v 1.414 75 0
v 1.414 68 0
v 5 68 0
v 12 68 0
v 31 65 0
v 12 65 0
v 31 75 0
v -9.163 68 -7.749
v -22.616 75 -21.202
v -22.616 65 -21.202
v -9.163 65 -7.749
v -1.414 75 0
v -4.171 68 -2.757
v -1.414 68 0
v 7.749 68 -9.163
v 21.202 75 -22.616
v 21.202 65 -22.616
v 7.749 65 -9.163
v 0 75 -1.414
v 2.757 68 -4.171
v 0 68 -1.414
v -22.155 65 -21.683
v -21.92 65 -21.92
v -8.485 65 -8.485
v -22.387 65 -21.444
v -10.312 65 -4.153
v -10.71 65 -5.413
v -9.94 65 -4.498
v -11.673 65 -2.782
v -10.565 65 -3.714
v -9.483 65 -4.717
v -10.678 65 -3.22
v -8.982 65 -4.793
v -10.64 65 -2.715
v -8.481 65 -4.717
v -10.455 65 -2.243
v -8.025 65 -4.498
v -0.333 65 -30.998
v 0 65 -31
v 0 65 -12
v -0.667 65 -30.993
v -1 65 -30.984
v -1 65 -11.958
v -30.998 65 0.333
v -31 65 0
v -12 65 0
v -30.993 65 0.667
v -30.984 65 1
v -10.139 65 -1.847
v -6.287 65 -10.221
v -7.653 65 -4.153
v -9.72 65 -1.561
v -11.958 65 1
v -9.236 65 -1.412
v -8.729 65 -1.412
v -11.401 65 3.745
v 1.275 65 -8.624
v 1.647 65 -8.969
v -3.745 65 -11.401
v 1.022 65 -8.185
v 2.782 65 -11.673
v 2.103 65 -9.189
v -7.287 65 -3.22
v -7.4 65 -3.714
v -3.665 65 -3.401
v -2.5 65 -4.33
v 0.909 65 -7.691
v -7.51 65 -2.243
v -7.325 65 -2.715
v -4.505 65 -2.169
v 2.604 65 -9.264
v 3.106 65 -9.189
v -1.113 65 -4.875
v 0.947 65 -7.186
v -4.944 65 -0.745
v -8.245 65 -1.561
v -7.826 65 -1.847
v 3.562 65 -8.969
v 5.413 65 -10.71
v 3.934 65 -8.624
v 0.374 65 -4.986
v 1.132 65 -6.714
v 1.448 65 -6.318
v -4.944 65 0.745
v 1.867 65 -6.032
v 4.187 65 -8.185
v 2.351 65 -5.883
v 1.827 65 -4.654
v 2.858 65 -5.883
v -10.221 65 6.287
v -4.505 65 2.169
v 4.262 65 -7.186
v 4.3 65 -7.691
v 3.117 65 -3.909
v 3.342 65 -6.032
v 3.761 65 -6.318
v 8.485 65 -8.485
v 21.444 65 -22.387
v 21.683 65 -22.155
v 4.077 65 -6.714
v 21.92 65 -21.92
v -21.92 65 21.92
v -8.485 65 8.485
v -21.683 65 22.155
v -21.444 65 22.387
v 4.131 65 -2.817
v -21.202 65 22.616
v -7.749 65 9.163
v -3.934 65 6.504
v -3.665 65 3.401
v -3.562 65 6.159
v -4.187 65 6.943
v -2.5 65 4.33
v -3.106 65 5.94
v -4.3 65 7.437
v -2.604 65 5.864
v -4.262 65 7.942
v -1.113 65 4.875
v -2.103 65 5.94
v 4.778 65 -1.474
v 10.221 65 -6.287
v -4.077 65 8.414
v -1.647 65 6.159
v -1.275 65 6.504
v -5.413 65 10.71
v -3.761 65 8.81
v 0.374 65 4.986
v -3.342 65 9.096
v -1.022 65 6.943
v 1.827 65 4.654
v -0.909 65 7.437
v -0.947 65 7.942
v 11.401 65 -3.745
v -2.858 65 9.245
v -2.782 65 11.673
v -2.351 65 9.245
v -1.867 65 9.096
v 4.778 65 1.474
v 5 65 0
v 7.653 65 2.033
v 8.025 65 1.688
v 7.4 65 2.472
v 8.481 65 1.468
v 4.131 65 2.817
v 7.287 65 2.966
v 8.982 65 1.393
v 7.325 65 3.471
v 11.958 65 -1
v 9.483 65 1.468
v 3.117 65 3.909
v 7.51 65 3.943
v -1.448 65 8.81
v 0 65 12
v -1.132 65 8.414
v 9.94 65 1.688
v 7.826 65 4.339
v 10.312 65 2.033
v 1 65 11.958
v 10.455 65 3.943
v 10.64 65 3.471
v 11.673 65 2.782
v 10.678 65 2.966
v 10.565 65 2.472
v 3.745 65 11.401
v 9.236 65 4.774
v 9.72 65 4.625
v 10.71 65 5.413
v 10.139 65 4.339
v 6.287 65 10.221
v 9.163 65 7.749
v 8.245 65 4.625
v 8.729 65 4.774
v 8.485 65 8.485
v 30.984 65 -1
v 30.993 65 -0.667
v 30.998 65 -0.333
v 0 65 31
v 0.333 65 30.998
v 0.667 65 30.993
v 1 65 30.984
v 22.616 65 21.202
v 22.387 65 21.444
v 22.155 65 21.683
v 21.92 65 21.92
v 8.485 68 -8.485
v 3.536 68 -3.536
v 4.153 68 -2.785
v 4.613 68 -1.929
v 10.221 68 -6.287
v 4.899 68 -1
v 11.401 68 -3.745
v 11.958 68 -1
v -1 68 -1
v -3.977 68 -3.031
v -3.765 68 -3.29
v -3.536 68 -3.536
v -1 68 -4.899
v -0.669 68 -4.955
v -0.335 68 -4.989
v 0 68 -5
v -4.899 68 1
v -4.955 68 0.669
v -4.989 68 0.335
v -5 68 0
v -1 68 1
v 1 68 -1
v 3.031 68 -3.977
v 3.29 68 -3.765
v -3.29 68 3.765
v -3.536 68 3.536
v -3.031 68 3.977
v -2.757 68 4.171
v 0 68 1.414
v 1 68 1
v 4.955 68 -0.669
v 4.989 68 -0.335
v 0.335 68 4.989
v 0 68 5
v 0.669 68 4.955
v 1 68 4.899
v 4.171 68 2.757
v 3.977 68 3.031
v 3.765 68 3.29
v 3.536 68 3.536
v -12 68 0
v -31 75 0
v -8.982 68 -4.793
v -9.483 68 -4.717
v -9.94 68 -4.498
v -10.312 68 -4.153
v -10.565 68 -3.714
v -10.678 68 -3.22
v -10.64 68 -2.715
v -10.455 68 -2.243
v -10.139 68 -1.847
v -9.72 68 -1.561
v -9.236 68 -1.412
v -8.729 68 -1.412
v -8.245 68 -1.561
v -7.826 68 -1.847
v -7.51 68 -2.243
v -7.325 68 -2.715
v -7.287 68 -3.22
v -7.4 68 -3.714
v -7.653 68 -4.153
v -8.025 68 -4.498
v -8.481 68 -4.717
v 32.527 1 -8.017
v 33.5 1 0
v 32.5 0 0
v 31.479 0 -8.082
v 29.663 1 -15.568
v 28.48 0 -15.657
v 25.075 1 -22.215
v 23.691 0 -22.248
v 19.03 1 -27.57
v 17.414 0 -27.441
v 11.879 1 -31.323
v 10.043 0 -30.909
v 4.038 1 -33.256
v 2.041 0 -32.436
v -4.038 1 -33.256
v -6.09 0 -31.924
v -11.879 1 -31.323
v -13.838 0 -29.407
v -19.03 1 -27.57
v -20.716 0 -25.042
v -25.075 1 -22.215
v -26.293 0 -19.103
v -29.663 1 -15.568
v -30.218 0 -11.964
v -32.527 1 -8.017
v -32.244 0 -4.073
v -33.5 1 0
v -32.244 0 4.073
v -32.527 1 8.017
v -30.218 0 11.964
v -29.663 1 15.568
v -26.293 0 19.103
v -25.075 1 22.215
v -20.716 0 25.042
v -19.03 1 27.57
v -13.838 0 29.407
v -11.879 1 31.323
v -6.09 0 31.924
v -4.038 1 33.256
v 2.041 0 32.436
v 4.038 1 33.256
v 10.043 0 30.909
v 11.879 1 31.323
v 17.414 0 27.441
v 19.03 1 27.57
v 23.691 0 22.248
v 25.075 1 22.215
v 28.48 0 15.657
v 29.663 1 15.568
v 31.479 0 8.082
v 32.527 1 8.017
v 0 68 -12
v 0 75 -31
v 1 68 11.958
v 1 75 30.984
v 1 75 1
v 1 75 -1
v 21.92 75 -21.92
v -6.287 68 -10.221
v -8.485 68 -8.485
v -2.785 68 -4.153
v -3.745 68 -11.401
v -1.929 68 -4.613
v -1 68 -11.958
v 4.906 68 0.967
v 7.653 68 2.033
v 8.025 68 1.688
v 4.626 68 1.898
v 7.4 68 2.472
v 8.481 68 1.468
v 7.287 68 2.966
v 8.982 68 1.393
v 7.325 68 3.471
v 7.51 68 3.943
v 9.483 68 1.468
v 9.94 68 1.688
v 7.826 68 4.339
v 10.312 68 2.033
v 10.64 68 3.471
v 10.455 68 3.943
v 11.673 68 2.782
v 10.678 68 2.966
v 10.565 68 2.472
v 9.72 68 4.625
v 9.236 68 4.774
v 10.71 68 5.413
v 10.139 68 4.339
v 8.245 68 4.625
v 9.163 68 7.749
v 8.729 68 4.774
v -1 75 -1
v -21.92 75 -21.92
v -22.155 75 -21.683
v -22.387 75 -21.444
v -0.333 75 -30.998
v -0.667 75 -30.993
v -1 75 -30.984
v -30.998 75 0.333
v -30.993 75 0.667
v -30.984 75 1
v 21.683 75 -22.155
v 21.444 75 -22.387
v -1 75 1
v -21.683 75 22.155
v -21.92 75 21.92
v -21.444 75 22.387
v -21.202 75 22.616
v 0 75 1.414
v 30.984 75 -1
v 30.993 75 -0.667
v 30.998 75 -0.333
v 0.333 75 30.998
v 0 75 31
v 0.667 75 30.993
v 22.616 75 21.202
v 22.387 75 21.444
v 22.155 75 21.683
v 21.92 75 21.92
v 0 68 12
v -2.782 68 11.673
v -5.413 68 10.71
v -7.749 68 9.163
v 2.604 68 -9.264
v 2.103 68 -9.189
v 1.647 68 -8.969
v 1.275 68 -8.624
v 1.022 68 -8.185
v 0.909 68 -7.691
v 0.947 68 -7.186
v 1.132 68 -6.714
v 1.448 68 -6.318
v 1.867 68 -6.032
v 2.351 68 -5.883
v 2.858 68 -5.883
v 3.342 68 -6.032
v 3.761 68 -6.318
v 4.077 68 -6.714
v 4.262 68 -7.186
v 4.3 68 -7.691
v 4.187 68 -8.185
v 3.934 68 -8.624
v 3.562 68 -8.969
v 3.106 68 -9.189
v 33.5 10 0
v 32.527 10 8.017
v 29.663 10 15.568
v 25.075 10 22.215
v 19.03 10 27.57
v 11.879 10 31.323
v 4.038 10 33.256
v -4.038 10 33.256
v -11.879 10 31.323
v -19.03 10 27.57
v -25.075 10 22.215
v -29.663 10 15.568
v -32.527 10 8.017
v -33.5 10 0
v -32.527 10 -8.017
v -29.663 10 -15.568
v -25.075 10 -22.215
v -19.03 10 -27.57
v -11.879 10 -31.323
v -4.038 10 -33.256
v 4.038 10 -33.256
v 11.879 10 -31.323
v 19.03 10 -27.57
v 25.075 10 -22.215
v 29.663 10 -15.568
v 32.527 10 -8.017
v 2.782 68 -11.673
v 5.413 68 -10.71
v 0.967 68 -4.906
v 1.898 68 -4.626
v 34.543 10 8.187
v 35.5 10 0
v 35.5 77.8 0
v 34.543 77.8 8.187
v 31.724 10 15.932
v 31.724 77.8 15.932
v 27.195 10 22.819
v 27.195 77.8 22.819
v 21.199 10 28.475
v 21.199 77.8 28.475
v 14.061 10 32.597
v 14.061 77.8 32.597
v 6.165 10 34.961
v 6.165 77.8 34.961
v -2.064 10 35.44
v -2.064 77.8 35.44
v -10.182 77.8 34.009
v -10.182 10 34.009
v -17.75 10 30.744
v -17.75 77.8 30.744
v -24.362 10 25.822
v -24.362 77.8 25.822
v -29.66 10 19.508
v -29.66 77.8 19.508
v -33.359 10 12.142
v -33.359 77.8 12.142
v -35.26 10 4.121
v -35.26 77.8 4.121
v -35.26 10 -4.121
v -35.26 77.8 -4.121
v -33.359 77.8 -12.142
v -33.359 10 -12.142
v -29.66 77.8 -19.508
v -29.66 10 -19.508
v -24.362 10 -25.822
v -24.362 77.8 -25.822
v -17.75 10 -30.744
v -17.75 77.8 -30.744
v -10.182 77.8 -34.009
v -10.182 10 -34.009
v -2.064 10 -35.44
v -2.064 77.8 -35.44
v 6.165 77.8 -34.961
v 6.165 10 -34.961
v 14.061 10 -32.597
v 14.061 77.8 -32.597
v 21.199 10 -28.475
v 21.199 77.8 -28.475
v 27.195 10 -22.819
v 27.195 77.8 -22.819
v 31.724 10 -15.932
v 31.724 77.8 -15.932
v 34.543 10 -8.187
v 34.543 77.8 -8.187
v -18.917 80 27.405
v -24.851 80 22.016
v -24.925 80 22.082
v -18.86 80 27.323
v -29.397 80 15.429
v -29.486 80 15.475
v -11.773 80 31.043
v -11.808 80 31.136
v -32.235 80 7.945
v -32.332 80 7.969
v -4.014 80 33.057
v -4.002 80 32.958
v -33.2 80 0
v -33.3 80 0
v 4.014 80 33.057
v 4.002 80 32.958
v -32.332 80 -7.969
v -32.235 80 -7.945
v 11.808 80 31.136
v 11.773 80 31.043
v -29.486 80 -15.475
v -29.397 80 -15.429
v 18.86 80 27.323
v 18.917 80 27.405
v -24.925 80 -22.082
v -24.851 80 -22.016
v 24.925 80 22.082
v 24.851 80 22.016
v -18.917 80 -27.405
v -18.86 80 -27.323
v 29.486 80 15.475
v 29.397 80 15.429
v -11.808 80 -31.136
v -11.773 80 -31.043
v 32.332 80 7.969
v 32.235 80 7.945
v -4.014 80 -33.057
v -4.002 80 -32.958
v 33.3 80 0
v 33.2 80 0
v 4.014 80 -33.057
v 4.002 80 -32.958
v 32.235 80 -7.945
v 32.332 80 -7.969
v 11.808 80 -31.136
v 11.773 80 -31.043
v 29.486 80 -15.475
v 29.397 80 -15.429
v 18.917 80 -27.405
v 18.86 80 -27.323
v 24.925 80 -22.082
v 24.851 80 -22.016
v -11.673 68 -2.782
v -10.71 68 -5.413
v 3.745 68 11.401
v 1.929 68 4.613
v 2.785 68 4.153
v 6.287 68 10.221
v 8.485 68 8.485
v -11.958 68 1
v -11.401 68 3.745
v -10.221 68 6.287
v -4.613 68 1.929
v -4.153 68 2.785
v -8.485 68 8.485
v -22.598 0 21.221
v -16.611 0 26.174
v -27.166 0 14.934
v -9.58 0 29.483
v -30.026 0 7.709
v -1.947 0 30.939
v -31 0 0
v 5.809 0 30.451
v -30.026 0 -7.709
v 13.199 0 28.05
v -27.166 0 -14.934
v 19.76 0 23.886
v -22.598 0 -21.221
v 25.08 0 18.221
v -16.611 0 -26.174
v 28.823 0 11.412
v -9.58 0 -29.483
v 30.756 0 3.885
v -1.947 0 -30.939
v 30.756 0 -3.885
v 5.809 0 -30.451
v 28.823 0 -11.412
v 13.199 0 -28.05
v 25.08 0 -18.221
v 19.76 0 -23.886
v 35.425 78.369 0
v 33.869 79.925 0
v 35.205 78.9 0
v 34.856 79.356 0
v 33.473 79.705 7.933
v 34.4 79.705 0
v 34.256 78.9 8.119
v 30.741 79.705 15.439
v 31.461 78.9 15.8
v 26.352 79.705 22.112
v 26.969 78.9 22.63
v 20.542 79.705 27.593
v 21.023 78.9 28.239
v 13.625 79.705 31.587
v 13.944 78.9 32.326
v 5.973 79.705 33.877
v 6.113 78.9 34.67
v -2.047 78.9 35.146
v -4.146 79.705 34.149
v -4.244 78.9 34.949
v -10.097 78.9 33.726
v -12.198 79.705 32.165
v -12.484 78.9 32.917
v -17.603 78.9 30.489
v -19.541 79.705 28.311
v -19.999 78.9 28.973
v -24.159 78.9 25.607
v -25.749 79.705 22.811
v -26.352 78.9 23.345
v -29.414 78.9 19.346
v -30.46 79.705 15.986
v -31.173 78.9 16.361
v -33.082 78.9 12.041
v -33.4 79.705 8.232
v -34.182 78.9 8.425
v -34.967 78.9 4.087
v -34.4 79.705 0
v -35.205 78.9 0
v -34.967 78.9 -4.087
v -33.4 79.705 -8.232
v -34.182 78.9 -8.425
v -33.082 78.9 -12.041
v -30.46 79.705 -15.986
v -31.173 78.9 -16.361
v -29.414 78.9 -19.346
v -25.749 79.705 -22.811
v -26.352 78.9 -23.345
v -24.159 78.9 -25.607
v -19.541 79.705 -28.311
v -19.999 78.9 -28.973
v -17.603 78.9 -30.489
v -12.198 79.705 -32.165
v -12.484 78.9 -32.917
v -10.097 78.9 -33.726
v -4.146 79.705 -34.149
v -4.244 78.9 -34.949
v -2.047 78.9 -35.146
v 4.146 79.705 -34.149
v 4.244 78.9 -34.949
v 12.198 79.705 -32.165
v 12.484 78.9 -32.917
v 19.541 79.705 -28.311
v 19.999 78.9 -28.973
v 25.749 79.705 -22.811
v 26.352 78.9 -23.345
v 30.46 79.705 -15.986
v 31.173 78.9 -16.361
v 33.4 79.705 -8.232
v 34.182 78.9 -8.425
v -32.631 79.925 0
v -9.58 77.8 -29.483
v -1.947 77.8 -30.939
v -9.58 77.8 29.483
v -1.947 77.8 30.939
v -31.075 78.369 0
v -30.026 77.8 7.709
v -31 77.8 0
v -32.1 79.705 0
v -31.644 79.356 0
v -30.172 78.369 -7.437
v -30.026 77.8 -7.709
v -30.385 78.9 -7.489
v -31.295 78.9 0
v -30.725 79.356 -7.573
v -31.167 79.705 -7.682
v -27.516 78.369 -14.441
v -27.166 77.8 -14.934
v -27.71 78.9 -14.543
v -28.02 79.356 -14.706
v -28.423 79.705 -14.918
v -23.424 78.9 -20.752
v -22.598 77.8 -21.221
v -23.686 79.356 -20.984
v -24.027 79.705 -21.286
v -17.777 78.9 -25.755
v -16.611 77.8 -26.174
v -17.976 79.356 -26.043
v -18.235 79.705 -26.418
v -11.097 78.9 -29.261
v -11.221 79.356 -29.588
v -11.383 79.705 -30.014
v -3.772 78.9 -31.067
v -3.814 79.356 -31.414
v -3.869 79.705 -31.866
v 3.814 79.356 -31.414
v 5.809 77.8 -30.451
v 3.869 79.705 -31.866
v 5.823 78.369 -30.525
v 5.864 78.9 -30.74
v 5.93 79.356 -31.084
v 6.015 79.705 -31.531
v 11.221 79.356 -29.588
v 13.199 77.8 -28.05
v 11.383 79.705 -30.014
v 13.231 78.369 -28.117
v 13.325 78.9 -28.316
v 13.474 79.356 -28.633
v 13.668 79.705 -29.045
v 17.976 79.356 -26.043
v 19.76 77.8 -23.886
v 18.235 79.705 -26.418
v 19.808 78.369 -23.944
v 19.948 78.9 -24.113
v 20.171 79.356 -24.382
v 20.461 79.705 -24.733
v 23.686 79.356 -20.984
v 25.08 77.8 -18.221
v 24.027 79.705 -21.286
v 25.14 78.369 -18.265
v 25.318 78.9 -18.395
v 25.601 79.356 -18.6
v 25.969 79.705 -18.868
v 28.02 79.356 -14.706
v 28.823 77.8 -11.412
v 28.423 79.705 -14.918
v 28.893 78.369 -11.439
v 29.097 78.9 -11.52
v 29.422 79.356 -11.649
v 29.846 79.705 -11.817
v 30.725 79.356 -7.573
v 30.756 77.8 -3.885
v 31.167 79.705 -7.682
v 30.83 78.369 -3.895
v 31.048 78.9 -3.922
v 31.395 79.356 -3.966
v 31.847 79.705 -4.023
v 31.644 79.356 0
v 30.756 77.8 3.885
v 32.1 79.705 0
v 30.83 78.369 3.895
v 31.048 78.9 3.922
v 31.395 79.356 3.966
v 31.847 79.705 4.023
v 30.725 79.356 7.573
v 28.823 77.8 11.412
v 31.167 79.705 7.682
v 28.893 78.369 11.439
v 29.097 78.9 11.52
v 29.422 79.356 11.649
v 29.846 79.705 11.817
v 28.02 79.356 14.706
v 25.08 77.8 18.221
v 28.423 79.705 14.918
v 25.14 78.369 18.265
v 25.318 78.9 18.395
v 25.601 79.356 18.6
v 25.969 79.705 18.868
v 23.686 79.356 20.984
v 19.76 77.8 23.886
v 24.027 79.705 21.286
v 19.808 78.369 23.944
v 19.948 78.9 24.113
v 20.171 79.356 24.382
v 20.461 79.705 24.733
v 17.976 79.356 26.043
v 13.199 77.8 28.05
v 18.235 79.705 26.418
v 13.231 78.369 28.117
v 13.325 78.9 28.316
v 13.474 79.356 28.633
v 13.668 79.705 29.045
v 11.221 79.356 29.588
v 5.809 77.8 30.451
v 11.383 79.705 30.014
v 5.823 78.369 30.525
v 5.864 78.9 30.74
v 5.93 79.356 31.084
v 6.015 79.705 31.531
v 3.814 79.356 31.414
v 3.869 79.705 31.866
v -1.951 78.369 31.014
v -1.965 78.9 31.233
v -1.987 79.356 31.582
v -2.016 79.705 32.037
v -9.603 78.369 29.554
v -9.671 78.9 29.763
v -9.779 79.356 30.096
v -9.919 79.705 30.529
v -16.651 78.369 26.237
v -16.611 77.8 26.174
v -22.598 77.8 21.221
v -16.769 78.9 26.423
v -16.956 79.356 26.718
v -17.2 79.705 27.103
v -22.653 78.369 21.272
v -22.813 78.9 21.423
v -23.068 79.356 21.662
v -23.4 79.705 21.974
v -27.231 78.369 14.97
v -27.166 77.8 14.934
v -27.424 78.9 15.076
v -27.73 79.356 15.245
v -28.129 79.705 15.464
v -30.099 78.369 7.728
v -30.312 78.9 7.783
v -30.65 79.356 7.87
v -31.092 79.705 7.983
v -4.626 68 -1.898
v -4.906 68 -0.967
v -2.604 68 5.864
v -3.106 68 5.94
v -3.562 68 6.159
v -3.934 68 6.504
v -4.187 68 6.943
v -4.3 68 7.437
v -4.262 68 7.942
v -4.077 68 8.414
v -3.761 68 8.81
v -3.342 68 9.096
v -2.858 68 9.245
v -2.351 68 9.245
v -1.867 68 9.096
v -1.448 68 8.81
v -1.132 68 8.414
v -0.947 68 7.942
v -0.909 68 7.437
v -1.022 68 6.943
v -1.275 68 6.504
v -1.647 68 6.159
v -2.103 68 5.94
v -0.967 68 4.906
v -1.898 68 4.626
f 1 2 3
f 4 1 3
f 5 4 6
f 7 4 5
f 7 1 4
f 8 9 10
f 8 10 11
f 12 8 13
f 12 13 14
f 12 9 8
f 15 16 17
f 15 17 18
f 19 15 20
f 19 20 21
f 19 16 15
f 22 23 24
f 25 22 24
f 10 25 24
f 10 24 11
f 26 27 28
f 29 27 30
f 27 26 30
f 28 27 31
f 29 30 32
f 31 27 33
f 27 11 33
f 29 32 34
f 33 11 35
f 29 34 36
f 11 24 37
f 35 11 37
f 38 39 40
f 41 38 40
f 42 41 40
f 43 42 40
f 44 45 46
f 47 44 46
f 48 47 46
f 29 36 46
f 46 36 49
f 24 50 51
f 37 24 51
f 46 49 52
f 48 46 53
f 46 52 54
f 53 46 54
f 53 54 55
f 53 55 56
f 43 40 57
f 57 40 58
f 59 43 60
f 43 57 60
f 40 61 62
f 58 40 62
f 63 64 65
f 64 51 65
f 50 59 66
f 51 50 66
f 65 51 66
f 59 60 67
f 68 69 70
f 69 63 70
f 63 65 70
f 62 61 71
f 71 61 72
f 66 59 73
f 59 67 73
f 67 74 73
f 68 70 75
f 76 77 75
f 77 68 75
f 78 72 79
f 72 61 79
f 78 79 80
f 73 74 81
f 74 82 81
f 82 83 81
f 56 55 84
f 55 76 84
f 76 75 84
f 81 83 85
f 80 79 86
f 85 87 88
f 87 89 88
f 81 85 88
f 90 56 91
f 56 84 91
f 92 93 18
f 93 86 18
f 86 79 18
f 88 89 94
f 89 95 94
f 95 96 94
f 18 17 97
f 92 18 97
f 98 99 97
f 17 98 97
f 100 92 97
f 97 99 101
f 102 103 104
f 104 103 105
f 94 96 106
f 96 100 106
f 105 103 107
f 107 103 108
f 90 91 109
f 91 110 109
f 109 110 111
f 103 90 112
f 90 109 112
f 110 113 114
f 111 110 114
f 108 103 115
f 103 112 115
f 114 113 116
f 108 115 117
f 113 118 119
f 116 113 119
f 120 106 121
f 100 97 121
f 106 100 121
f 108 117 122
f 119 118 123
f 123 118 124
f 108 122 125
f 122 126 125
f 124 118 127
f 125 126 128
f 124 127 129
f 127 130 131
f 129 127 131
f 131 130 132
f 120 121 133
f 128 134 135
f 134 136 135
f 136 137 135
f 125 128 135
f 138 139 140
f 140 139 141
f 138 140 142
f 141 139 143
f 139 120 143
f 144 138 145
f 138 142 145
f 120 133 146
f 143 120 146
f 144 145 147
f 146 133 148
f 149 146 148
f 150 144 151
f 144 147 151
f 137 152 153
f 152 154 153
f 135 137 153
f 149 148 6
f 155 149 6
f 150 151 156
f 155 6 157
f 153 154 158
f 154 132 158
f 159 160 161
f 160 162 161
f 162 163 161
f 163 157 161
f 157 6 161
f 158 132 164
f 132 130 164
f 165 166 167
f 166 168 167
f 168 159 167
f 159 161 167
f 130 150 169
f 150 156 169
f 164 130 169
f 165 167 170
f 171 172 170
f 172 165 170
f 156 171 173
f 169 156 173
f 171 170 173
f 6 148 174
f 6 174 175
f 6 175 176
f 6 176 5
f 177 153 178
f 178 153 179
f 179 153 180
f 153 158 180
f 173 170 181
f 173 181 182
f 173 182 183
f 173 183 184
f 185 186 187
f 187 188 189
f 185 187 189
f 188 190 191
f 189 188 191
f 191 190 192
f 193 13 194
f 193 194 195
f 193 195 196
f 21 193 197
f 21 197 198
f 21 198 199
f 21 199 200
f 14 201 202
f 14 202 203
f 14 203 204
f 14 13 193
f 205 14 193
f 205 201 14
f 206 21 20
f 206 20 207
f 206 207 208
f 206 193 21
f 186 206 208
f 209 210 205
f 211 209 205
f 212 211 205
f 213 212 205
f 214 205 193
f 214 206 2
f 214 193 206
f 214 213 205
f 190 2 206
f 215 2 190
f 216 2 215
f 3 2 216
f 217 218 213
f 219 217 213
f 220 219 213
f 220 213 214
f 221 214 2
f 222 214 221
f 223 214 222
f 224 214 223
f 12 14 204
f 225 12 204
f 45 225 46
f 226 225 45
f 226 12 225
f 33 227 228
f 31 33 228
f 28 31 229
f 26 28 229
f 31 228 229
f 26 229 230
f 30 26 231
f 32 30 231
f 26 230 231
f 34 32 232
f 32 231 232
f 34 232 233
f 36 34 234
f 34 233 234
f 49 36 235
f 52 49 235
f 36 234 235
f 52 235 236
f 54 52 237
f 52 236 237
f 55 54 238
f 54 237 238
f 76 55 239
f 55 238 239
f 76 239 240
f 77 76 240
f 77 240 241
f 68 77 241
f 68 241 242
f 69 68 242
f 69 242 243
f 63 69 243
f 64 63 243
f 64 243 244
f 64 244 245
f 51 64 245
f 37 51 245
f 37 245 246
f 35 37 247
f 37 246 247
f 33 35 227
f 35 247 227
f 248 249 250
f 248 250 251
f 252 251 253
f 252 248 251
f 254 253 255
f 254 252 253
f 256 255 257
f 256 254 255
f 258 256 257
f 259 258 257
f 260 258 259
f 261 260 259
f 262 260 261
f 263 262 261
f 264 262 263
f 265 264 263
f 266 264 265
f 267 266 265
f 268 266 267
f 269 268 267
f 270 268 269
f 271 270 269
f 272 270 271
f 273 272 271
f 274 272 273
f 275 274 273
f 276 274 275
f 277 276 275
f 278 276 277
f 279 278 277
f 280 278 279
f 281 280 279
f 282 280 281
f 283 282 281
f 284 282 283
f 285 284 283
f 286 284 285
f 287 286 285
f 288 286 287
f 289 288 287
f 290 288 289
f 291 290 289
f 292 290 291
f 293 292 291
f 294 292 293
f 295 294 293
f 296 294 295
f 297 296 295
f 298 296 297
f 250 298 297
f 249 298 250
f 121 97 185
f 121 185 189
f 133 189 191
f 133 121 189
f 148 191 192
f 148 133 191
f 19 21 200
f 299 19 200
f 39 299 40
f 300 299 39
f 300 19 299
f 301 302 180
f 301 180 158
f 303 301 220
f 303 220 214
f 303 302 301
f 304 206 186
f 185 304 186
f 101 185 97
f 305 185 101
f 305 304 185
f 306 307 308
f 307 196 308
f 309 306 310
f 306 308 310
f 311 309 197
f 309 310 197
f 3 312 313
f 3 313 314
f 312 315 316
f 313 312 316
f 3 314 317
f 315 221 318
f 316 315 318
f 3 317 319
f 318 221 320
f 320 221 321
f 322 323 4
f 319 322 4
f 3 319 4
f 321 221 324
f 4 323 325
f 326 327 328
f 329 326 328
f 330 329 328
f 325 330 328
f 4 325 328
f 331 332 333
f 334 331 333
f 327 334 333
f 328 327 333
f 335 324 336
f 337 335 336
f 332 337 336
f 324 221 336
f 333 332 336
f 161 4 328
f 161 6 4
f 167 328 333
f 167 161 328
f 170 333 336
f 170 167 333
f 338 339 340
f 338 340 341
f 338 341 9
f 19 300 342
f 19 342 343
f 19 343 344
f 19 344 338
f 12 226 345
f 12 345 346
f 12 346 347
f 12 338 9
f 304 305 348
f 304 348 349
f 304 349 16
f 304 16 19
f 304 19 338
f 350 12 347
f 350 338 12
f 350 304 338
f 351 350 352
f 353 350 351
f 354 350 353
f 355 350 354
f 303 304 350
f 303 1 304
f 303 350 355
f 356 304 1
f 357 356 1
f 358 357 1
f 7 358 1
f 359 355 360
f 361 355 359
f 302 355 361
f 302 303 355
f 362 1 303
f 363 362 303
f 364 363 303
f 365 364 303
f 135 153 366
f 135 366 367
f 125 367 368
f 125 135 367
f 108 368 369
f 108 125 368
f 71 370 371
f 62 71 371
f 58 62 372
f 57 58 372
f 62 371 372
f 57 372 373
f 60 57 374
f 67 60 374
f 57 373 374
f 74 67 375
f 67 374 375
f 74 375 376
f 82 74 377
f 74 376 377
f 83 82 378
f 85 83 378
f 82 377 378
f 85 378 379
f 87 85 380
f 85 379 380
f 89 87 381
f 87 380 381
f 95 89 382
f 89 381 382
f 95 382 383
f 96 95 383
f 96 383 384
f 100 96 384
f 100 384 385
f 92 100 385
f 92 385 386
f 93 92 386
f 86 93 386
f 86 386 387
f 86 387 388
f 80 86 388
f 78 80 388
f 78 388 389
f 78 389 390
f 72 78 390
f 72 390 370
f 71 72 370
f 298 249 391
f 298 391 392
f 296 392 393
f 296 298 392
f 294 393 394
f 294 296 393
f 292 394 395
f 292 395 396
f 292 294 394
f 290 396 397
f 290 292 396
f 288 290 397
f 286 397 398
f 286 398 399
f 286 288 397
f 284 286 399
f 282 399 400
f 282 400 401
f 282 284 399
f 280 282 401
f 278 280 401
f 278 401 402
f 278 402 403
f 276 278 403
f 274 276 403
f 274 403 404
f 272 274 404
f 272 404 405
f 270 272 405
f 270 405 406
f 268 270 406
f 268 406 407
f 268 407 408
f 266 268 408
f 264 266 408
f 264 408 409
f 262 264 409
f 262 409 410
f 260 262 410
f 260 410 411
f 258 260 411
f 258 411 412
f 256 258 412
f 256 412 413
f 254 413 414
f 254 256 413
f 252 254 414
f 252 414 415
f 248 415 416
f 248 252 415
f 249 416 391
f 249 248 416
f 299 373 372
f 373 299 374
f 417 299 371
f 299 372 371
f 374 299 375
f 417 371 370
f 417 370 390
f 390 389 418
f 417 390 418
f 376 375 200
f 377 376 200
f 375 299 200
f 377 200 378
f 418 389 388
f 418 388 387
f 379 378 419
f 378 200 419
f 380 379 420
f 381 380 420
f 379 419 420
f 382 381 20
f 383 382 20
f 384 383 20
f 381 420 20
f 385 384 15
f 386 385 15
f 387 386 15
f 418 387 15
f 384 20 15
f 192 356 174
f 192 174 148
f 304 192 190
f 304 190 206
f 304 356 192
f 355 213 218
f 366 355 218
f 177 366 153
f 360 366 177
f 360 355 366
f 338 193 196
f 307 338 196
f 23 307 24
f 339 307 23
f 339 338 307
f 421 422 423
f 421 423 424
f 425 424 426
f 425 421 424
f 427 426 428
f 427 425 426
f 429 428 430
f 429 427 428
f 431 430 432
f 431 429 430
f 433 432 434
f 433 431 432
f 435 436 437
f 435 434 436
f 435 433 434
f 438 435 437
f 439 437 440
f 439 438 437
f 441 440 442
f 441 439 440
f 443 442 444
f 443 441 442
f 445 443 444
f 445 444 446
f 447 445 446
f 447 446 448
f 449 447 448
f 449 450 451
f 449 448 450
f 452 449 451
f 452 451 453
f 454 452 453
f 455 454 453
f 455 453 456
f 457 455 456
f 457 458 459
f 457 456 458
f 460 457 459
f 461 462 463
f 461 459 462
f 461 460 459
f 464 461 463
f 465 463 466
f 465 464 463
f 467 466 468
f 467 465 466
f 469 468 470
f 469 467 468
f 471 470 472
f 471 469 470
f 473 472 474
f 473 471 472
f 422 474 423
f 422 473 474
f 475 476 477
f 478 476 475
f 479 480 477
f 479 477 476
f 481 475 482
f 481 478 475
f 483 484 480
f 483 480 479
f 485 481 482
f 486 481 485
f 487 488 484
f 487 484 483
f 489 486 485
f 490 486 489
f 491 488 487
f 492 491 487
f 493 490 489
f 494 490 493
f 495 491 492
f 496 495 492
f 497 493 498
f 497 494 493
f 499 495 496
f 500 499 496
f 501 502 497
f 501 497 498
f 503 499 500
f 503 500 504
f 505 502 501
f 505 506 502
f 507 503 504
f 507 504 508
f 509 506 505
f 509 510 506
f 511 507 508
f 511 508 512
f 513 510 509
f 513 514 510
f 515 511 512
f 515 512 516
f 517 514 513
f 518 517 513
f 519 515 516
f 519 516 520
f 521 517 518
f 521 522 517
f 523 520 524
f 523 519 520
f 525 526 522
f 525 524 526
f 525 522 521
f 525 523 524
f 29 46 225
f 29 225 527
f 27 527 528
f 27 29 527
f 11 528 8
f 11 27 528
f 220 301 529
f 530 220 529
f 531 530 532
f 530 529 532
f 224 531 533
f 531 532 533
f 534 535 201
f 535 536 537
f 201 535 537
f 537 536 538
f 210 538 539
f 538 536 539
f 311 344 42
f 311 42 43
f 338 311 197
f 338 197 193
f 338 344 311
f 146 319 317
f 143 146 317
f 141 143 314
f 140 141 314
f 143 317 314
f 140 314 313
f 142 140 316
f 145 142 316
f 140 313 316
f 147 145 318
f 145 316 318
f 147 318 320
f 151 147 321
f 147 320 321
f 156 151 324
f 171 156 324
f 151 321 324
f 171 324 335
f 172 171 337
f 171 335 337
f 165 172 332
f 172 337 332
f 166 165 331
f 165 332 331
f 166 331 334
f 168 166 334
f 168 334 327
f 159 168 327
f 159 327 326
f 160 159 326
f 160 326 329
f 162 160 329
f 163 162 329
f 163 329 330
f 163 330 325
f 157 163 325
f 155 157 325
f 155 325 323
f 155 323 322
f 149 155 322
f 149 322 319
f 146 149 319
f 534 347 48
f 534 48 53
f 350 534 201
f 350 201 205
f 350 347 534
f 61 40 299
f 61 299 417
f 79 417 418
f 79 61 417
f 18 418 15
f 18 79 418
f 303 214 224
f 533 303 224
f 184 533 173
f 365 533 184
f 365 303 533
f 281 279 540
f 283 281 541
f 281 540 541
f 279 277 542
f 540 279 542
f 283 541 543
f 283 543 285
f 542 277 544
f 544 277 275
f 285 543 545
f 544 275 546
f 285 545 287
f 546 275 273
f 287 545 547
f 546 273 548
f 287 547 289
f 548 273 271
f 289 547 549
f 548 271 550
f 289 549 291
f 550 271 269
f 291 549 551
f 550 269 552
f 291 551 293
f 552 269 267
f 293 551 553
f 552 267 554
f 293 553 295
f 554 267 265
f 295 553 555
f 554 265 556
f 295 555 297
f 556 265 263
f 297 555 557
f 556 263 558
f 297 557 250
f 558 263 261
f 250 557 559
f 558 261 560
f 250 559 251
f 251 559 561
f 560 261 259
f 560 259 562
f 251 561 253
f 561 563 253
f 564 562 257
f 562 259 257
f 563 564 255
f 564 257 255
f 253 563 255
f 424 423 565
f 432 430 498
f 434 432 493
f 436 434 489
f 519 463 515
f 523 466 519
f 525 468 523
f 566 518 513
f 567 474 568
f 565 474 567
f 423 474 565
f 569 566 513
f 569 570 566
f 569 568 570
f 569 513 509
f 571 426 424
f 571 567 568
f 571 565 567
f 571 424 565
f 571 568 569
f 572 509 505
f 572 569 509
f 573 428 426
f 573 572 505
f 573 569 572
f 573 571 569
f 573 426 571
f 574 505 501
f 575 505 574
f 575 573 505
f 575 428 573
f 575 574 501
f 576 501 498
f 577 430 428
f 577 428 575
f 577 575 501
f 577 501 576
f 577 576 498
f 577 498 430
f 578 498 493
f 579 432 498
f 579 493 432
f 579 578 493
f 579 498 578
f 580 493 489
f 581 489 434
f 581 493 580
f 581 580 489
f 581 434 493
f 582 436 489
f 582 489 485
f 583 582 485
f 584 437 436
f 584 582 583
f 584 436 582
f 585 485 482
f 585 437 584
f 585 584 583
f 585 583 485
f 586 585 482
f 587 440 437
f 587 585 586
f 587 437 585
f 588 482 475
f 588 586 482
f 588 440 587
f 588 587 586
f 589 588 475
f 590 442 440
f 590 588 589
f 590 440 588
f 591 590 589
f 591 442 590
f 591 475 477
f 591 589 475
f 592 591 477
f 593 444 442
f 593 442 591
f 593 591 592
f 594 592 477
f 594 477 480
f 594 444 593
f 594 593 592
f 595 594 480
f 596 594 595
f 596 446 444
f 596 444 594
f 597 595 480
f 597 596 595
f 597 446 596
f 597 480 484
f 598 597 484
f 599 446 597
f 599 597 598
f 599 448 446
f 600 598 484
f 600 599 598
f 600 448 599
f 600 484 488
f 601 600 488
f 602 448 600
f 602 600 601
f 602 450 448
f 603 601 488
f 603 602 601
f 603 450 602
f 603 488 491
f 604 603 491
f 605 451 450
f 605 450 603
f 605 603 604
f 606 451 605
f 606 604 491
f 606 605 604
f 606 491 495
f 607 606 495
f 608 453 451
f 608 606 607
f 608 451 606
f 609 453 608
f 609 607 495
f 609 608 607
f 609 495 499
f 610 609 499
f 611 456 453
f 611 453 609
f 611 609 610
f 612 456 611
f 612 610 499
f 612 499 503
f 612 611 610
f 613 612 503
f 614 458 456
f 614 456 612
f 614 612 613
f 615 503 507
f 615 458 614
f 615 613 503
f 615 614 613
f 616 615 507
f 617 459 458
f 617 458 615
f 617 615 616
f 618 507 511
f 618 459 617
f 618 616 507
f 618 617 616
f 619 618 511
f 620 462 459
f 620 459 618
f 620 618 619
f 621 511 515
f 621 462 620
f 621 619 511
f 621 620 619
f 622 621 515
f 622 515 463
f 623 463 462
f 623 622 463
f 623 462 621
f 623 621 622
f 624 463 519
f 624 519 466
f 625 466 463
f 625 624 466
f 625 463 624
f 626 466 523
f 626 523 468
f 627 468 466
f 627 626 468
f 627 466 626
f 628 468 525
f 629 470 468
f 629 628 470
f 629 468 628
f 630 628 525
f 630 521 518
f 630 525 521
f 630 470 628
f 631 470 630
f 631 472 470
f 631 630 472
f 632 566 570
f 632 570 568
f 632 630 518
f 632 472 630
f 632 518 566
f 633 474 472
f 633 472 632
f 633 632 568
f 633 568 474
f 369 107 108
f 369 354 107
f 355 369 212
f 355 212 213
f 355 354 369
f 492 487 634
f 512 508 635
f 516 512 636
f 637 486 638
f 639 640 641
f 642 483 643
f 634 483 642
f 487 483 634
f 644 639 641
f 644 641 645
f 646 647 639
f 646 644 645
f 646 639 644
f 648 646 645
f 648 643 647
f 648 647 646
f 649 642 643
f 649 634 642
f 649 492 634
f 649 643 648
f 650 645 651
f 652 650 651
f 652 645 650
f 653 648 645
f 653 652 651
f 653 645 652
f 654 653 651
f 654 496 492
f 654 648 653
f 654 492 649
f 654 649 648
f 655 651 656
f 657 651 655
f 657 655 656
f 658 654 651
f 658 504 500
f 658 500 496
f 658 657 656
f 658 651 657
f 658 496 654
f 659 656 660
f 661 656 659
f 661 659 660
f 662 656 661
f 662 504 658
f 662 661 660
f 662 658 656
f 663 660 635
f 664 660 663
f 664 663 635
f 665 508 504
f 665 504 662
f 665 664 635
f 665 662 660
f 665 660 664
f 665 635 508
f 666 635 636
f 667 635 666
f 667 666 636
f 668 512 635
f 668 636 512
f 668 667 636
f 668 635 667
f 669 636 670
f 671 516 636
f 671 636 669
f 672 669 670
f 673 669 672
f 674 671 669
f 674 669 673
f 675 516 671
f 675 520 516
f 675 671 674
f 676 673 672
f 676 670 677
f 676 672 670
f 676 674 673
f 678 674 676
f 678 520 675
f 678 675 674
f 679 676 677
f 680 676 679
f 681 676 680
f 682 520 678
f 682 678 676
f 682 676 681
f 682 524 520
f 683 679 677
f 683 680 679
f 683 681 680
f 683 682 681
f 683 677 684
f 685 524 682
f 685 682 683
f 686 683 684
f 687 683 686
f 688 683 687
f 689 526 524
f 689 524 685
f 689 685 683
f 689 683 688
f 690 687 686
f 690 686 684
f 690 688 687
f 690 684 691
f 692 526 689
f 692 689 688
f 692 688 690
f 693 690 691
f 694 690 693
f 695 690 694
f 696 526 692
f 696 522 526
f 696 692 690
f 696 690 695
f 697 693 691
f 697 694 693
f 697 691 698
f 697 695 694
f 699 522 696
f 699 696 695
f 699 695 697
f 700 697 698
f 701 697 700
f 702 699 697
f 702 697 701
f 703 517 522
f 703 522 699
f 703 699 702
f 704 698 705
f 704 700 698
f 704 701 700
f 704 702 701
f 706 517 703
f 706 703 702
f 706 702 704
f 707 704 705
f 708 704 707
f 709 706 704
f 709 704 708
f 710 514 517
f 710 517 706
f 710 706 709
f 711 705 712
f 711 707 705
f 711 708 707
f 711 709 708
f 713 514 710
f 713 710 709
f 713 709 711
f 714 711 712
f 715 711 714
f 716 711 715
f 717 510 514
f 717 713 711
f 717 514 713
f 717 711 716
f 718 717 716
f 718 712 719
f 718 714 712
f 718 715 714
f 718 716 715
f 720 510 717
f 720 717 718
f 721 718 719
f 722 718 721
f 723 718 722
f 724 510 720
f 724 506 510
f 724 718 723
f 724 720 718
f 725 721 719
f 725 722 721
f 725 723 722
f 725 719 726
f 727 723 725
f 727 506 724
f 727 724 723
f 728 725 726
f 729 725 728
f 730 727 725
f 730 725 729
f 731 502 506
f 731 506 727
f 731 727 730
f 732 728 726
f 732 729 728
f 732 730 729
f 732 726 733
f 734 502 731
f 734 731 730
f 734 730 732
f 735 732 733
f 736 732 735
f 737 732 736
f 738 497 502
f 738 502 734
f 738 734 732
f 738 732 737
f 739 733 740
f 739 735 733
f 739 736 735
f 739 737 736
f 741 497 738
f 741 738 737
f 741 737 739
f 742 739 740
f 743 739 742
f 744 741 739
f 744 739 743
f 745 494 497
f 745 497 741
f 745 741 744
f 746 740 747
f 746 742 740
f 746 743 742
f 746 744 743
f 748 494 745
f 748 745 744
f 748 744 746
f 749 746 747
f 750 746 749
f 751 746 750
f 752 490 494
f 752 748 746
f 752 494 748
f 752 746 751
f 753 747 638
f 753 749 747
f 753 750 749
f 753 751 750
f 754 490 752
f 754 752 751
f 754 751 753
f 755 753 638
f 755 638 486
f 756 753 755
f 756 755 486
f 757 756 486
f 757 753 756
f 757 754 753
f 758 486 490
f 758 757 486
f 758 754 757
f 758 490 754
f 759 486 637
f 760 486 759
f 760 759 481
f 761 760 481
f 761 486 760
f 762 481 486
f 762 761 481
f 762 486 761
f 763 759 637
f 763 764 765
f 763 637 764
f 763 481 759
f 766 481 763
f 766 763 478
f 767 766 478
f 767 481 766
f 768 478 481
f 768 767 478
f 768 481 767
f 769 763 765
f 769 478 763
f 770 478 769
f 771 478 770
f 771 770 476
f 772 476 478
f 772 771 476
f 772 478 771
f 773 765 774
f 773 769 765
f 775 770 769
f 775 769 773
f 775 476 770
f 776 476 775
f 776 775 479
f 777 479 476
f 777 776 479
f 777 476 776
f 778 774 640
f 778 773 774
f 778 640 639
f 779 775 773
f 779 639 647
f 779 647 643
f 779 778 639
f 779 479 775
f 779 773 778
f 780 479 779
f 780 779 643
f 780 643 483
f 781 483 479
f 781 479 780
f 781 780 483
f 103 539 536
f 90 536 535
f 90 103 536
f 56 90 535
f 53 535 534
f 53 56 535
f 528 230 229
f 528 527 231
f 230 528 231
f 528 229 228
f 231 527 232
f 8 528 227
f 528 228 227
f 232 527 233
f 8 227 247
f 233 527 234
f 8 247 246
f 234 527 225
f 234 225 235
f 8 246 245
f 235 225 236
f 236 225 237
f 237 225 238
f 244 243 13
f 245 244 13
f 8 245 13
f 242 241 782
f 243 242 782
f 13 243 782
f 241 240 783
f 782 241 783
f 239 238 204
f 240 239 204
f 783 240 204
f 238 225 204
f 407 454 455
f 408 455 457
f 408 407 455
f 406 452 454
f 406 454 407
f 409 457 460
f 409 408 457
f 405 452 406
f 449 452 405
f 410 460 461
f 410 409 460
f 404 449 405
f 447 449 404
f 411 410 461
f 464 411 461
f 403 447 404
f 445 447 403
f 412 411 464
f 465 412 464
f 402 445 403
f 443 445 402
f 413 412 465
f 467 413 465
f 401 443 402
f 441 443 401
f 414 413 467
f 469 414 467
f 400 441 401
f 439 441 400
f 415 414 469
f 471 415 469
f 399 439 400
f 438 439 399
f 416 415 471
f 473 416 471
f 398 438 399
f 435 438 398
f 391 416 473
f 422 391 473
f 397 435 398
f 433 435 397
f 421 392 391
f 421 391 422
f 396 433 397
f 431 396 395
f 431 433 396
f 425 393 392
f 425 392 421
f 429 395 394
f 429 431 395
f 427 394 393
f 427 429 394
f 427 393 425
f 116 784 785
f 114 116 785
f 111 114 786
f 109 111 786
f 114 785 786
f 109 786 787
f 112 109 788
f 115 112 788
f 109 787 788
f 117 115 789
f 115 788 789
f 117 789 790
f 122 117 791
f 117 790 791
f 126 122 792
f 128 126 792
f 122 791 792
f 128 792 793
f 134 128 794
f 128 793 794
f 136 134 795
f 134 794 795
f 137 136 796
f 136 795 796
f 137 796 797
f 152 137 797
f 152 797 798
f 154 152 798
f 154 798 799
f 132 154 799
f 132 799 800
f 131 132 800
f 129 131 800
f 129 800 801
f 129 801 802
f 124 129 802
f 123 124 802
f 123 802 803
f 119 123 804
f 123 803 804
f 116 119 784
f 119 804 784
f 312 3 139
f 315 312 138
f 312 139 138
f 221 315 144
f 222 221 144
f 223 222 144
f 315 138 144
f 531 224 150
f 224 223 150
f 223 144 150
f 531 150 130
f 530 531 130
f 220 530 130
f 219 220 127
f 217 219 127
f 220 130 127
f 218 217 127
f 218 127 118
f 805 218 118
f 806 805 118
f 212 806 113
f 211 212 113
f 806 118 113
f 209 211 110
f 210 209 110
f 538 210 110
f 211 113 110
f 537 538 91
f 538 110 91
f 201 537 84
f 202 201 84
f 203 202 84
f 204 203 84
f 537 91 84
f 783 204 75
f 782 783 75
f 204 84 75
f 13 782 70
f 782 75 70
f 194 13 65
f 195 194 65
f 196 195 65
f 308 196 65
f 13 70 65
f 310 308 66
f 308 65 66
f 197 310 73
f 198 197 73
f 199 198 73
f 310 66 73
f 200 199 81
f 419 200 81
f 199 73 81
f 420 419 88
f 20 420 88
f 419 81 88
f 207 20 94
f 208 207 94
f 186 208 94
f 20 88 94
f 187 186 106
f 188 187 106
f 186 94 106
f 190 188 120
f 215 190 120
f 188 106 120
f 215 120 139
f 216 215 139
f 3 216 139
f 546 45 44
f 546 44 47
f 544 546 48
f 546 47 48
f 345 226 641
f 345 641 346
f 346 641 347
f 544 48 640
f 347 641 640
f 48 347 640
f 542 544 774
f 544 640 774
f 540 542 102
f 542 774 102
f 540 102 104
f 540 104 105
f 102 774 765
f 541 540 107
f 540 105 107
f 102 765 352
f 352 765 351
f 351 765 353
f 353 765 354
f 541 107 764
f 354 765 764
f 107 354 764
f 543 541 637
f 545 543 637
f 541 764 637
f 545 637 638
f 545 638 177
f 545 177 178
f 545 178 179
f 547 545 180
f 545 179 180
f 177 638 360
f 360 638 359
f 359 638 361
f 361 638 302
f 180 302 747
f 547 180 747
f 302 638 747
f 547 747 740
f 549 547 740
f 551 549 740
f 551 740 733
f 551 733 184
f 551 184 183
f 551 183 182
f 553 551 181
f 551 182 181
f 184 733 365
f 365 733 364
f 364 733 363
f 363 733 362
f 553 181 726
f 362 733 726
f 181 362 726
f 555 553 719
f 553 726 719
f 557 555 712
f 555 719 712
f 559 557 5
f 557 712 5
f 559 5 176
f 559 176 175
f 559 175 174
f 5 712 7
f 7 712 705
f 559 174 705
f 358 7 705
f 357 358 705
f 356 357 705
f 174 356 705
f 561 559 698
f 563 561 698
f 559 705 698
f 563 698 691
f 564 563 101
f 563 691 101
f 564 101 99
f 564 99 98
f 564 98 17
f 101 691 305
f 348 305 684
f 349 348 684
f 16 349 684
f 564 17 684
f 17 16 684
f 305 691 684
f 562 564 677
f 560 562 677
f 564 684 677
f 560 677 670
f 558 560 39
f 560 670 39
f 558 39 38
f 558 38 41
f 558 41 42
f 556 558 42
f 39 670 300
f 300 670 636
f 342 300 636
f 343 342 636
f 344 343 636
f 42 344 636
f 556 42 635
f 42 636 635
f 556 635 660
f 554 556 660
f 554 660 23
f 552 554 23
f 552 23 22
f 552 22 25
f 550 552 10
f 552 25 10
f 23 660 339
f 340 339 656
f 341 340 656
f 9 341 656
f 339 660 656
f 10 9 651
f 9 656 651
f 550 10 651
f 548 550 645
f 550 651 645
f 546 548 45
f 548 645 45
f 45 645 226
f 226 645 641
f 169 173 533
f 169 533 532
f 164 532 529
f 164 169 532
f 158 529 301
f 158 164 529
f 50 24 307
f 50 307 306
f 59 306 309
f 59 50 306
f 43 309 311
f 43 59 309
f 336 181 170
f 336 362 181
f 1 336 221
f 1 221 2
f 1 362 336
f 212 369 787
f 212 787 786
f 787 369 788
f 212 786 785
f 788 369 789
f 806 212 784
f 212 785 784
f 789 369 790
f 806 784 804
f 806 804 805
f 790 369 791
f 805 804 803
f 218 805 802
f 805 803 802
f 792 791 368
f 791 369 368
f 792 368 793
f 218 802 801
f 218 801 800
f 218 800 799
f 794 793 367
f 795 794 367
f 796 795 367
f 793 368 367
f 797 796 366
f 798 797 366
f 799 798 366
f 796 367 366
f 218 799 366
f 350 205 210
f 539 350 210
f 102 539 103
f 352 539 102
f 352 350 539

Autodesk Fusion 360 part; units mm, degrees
sketch "草图1" plane through (0, 0, 0) normal (0, 1, 0) x (1, 0, 0)
  circle A0 centre (0, 0) radius 35.5
  dimension "d1" = 71
extrude "拉伸1" add sketch "草图1" along normal blind 80
sketch "草图2" plane through (0, 80, 0) normal (0, 1, 0) x (-1, 0, 0)
  circle A0 centre (0, 0) radius 35.5
  circle A1 centre (0, 0) radius 31
  dimension "d4" = 62
extrude "拉伸2" cut sketch "草图2" against normal blind 90 contours A1
ref_plane "WorkPlane2" through (0, 75, 0) normal (0, 1, 0) x (-1, 0, 0)
sketch "Sketch5" plane through (0, 75, 0) normal (0, 1, 0) x (1, 0, 0)
  line L0 (0, 0) -> (31, 0)
  line L1 (31, 0) -> (31, 1)
  line L2 (31, 1) -> (0, 1)
  line L3 (0, 1) -> (0, 0)
  circle A0 centre (0, 0) radius 35.5
  circle A1 centre (0, 0) radius 35.5
  circle A2 centre (0, 0) radius 31
  dimension "d18" = 1
extrude "Extrude5" add sketch "Sketch5" against normal blind 10 contours L0 L2 L3 A2 picked at (10.328, 0.6667)
pattern_circular "C-Pattern1" count 8 over 360 about axis through (0, 1.75, 0) along (0, 1, 0) of "Extrude5"
sketch "Sketch6" plane through (0, 65, 0) normal (0, -1, 0) x (1, 0, 0)
  line L0 (1.4142, 0) -> (22.616, 21.2018)
  arc A0 (22.616, 21.2018) -> (21.9203, 21.9203) centre (0, 0) ccw
  line L1 (21.9203, 21.9203) -> (1, 1)
  line L2 (1, 1) -> (1, 30.9839)
  arc A1 (1, 30.9839) -> (0, 31) centre (0, 0) ccw
  line L3 (0, 31) -> (0, 1.4142)
  line L4 (0, 1.4142) -> (-21.2018, 22.616)
  arc A2 (-21.2018, 22.616) -> (-21.9203, 21.9203) centre (0, 0) ccw
  line L5 (-21.9203, 21.9203) -> (-1, 1)
  line L6 (-1, 1) -> (-30.9839, 1)
  arc A3 (-30.9839, 1) -> (-31, 0) centre (0, 0) ccw
  line L7 (-31, 0) -> (-1.4142, 0)
  line L8 (-1.4142, 0) -> (-22.616, -21.2018)
  arc A4 (-22.616, -21.2018) -> (-21.9203, -21.9203) centre (0, 0) ccw
  line L9 (-21.9203, -21.9203) -> (-1, -1)
  line L10 (-1, -1) -> (-1, -30.9839)
  arc A5 (-1, -30.9839) -> (0, -31) centre (0, 0) ccw
  line L11 (0, -31) -> (0, -1.4142)
  line L12 (0, -1.4142) -> (21.2018, -22.616)
  arc A6 (21.2018, -22.616) -> (21.9203, -21.9203) centre (0, 0) ccw
  line L13 (21.9203, -21.9203) -> (1, -1)
  line L14 (1, -1) -> (30.9839, -1)
  arc A7 (30.9839, -1) -> (31, 0) centre (0, 0) ccw
  line L15 (31, 0) -> (1.4142, 0)
  circle A8 centre (0, 0) radius 12
  dimension "d23" = 24
extrude "Extrude6" add sketch "Sketch6" against normal blind 3 contours L0 L1 L2 L3 L4 L5 L6 L7 L8 L9 L10 L11 L12 L13 L14 L15 A8 | L0 L15 A8 | L1 L2 A8 | L13 L14 A8 | L3 L4 A8 | L11 L12 A8 | L5 L6 A8 | L9 L10 A8 | L7 L8 A8
sketch "Sketch7" plane through (0, 65, 0) normal (0, -1, 0) x (1, 0, 0)
  line L0 (9.1629, 7.7487) -> (22.616, 21.2018)
  arc A0 (22.616, 21.2018) -> (21.9203, 21.9203) centre (0, 0) ccw
  line L1 (21.9203, 21.9203) -> (8.4853, 8.4853)
  arc A1 (8.4853, 8.4853) -> (1, 11.9583) centre (0, 0) ccw
  line L2 (1, 11.9583) -> (1, 30.9839)
  arc A2 (1, 30.9839) -> (0, 31) centre (0, 0) ccw
  line L3 (0, 31) -> (0, 12)
  arc A3 (0, 12) -> (-7.7487, 9.1629) centre (0, 0) ccw
  line L4 (-7.7487, 9.1629) -> (-21.2018, 22.616)
  arc A4 (-21.2018, 22.616) -> (-21.9203, 21.9203) centre (0, 0) ccw
  line L5 (-21.9203, 21.9203) -> (-8.4853, 8.4853)
  arc A5 (-8.4853, 8.4853) -> (-11.9583, 1) centre (0, 0) ccw
  line L6 (-11.9583, 1) -> (-30.9839, 1)
  arc A6 (-30.9839, 1) -> (-31, 0) centre (0, 0) ccw
  line L7 (-31, 0) -> (-12, 0)
  arc A7 (-12, 0) -> (-9.1629, -7.7487) centre (0, 0) ccw
  line L8 (-9.1629, -7.7487) -> (-22.616, -21.2018)
  arc A8 (-22.616, -21.2018) -> (-21.9203, -21.9203) centre (0, 0) ccw
  line L9 (-21.9203, -21.9203) -> (-8.4853, -8.4853)
  arc A9 (-8.4853, -8.4853) -> (-1, -11.9583) centre (0, 0) ccw
  line L10 (-1, -11.9583) -> (-1, -30.9839)
  arc A10 (-1, -30.9839) -> (0, -31) centre (0, 0) ccw
  arc A11 (0, -12) -> (7.7487, -9.1629) centre (0, 0) ccw
  line L11 (7.7487, -9.1629) -> (21.2018, -22.616)
  arc A12 (21.2018, -22.616) -> (21.9203, -21.9203) centre (0, 0) ccw
  line L12 (21.9203, -21.9203) -> (8.4853, -8.4853)
  arc A13 (8.4853, -8.4853) -> (11.9583, -1) centre (0, 0) ccw
  line L13 (11.9583, -1) -> (30.9839, -1)
  arc A14 (30.9839, -1) -> (31, 0) centre (0, 0) ccw
  arc A15 (12, 0) -> (9.1629, 7.7487) centre (0, 0) ccw
  circle A16 centre (0, 0) radius 5
  line L14 (0, -31) -> (0, -12)
  line L15 (31, 0) -> (12, 0)
  dimension "d26" = 10
extrude "Extrude7" cut sketch "Sketch7" against normal blind 3 contours A16
sketch "Sketch8" plane through (0, 65, 0) normal (0, -1, 0) x (1, 0, 0)
  circle A0 centre (0, 0) radius 5
  line L0 (9.1629, 7.7487) -> (22.616, 21.2018)
  arc A1 (22.616, 21.2018) -> (21.9203, 21.9203) centre (0, 0) ccw
  line L1 (21.9203, 21.9203) -> (8.4853, 8.4853)
  arc A2 (8.4853, 8.4853) -> (1, 11.9583) centre (0, 0) ccw
  line L2 (1, 11.9583) -> (1, 30.9839)
  arc A3 (1, 30.9839) -> (0, 31) centre (0, 0) ccw
  line L3 (0, 31) -> (0, 12)
  arc A4 (0, 12) -> (-7.7487, 9.1629) centre (0, 0) ccw
  line L4 (-7.7487, 9.1629) -> (-21.2018, 22.616)
  arc A5 (-21.2018, 22.616) -> (-21.9203, 21.9203) centre (0, 0) ccw
  line L5 (-21.9203, 21.9203) -> (-8.4853, 8.4853)
  arc A6 (-8.4853, 8.4853) -> (-11.9583, 1) centre (0, 0) ccw
  line L6 (-11.9583, 1) -> (-30.9839, 1)
  arc A7 (-30.9839, 1) -> (-31, 0) centre (0, 0) ccw
  line L7 (-31, 0) -> (-12, 0)
  arc A8 (-12, 0) -> (-9.1629, -7.7487) centre (0, 0) ccw
  line L8 (-9.1629, -7.7487) -> (-22.616, -21.2018)
  arc A9 (-22.616, -21.2018) -> (-21.9203, -21.9203) centre (0, 0) ccw
  line L9 (-21.9203, -21.9203) -> (-8.4853, -8.4853)
  arc A10 (-8.4853, -8.4853) -> (-1, -11.9583) centre (0, 0) ccw
  line L10 (-1, -11.9583) -> (-1, -30.9839)
  arc A11 (-1, -30.9839) -> (0, -31) centre (0, 0) ccw
  arc A12 (0, -12) -> (7.7487, -9.1629) centre (0, 0) ccw
  line L11 (7.7487, -9.1629) -> (21.2018, -22.616)
  arc A13 (21.2018, -22.616) -> (21.9203, -21.9203) centre (0, 0) ccw
  line L12 (21.9203, -21.9203) -> (8.4853, -8.4853)
  arc A14 (8.4853, -8.4853) -> (11.9583, -1) centre (0, 0) ccw
  line L13 (11.9583, -1) -> (30.9839, -1)
  arc A15 (30.9839, -1) -> (31, 0) centre (0, 0) ccw
  arc A16 (12, 0) -> (9.1629, 7.7487) centre (0, 0) ccw
  line L14 (-42.8424, -14.7518) -> (51.2572, 17.6493) construction
  line L15 (-13.299, 38.6232) -> (13.2323, -38.4293) construction
  circle A17 centre (0, 0) radius 9.5 construction
  circle A18 centre (0, 0) radius 8 construction
  line L16 (0, -31) -> (0, -12)
  line L17 (31, 0) -> (12, 0)
  dimension "d29" = 90
  dimension "d31" = 19
  dimension "d32" = 16
hole "Hole1" at (-2.6045, 65, 7.5641) at (8.9824, 65, 3.0929) at (2.6045, 65, -7.5641) at (-8.9824, 65, -3.0929) direction (0, 1, 0) diameter 3.4 depth 3 tip angle 118
fillet "Fillet2" radius 2.2 2 edges at (-33.0976, 80, 12.8373) (28.9021, 80, 11.2101)
sketch "Sketch9" plane through (0, 0, 0) normal (0, -1, 0) x (1, 0, 0)
  circle A0 centre (0, 0) radius 31
  circle A1 centre (0, 0) radius 35.5
  circle A2 centre (0, 0) radius 33.5
  dimension "d45" = 67
extrude "Extrude8" cut sketch "Sketch9" against normal blind 10 contours A1
chamfer "Chamfer1" distance 1 angle 45 1 edges at (-31.233, 0, -12.1141)
